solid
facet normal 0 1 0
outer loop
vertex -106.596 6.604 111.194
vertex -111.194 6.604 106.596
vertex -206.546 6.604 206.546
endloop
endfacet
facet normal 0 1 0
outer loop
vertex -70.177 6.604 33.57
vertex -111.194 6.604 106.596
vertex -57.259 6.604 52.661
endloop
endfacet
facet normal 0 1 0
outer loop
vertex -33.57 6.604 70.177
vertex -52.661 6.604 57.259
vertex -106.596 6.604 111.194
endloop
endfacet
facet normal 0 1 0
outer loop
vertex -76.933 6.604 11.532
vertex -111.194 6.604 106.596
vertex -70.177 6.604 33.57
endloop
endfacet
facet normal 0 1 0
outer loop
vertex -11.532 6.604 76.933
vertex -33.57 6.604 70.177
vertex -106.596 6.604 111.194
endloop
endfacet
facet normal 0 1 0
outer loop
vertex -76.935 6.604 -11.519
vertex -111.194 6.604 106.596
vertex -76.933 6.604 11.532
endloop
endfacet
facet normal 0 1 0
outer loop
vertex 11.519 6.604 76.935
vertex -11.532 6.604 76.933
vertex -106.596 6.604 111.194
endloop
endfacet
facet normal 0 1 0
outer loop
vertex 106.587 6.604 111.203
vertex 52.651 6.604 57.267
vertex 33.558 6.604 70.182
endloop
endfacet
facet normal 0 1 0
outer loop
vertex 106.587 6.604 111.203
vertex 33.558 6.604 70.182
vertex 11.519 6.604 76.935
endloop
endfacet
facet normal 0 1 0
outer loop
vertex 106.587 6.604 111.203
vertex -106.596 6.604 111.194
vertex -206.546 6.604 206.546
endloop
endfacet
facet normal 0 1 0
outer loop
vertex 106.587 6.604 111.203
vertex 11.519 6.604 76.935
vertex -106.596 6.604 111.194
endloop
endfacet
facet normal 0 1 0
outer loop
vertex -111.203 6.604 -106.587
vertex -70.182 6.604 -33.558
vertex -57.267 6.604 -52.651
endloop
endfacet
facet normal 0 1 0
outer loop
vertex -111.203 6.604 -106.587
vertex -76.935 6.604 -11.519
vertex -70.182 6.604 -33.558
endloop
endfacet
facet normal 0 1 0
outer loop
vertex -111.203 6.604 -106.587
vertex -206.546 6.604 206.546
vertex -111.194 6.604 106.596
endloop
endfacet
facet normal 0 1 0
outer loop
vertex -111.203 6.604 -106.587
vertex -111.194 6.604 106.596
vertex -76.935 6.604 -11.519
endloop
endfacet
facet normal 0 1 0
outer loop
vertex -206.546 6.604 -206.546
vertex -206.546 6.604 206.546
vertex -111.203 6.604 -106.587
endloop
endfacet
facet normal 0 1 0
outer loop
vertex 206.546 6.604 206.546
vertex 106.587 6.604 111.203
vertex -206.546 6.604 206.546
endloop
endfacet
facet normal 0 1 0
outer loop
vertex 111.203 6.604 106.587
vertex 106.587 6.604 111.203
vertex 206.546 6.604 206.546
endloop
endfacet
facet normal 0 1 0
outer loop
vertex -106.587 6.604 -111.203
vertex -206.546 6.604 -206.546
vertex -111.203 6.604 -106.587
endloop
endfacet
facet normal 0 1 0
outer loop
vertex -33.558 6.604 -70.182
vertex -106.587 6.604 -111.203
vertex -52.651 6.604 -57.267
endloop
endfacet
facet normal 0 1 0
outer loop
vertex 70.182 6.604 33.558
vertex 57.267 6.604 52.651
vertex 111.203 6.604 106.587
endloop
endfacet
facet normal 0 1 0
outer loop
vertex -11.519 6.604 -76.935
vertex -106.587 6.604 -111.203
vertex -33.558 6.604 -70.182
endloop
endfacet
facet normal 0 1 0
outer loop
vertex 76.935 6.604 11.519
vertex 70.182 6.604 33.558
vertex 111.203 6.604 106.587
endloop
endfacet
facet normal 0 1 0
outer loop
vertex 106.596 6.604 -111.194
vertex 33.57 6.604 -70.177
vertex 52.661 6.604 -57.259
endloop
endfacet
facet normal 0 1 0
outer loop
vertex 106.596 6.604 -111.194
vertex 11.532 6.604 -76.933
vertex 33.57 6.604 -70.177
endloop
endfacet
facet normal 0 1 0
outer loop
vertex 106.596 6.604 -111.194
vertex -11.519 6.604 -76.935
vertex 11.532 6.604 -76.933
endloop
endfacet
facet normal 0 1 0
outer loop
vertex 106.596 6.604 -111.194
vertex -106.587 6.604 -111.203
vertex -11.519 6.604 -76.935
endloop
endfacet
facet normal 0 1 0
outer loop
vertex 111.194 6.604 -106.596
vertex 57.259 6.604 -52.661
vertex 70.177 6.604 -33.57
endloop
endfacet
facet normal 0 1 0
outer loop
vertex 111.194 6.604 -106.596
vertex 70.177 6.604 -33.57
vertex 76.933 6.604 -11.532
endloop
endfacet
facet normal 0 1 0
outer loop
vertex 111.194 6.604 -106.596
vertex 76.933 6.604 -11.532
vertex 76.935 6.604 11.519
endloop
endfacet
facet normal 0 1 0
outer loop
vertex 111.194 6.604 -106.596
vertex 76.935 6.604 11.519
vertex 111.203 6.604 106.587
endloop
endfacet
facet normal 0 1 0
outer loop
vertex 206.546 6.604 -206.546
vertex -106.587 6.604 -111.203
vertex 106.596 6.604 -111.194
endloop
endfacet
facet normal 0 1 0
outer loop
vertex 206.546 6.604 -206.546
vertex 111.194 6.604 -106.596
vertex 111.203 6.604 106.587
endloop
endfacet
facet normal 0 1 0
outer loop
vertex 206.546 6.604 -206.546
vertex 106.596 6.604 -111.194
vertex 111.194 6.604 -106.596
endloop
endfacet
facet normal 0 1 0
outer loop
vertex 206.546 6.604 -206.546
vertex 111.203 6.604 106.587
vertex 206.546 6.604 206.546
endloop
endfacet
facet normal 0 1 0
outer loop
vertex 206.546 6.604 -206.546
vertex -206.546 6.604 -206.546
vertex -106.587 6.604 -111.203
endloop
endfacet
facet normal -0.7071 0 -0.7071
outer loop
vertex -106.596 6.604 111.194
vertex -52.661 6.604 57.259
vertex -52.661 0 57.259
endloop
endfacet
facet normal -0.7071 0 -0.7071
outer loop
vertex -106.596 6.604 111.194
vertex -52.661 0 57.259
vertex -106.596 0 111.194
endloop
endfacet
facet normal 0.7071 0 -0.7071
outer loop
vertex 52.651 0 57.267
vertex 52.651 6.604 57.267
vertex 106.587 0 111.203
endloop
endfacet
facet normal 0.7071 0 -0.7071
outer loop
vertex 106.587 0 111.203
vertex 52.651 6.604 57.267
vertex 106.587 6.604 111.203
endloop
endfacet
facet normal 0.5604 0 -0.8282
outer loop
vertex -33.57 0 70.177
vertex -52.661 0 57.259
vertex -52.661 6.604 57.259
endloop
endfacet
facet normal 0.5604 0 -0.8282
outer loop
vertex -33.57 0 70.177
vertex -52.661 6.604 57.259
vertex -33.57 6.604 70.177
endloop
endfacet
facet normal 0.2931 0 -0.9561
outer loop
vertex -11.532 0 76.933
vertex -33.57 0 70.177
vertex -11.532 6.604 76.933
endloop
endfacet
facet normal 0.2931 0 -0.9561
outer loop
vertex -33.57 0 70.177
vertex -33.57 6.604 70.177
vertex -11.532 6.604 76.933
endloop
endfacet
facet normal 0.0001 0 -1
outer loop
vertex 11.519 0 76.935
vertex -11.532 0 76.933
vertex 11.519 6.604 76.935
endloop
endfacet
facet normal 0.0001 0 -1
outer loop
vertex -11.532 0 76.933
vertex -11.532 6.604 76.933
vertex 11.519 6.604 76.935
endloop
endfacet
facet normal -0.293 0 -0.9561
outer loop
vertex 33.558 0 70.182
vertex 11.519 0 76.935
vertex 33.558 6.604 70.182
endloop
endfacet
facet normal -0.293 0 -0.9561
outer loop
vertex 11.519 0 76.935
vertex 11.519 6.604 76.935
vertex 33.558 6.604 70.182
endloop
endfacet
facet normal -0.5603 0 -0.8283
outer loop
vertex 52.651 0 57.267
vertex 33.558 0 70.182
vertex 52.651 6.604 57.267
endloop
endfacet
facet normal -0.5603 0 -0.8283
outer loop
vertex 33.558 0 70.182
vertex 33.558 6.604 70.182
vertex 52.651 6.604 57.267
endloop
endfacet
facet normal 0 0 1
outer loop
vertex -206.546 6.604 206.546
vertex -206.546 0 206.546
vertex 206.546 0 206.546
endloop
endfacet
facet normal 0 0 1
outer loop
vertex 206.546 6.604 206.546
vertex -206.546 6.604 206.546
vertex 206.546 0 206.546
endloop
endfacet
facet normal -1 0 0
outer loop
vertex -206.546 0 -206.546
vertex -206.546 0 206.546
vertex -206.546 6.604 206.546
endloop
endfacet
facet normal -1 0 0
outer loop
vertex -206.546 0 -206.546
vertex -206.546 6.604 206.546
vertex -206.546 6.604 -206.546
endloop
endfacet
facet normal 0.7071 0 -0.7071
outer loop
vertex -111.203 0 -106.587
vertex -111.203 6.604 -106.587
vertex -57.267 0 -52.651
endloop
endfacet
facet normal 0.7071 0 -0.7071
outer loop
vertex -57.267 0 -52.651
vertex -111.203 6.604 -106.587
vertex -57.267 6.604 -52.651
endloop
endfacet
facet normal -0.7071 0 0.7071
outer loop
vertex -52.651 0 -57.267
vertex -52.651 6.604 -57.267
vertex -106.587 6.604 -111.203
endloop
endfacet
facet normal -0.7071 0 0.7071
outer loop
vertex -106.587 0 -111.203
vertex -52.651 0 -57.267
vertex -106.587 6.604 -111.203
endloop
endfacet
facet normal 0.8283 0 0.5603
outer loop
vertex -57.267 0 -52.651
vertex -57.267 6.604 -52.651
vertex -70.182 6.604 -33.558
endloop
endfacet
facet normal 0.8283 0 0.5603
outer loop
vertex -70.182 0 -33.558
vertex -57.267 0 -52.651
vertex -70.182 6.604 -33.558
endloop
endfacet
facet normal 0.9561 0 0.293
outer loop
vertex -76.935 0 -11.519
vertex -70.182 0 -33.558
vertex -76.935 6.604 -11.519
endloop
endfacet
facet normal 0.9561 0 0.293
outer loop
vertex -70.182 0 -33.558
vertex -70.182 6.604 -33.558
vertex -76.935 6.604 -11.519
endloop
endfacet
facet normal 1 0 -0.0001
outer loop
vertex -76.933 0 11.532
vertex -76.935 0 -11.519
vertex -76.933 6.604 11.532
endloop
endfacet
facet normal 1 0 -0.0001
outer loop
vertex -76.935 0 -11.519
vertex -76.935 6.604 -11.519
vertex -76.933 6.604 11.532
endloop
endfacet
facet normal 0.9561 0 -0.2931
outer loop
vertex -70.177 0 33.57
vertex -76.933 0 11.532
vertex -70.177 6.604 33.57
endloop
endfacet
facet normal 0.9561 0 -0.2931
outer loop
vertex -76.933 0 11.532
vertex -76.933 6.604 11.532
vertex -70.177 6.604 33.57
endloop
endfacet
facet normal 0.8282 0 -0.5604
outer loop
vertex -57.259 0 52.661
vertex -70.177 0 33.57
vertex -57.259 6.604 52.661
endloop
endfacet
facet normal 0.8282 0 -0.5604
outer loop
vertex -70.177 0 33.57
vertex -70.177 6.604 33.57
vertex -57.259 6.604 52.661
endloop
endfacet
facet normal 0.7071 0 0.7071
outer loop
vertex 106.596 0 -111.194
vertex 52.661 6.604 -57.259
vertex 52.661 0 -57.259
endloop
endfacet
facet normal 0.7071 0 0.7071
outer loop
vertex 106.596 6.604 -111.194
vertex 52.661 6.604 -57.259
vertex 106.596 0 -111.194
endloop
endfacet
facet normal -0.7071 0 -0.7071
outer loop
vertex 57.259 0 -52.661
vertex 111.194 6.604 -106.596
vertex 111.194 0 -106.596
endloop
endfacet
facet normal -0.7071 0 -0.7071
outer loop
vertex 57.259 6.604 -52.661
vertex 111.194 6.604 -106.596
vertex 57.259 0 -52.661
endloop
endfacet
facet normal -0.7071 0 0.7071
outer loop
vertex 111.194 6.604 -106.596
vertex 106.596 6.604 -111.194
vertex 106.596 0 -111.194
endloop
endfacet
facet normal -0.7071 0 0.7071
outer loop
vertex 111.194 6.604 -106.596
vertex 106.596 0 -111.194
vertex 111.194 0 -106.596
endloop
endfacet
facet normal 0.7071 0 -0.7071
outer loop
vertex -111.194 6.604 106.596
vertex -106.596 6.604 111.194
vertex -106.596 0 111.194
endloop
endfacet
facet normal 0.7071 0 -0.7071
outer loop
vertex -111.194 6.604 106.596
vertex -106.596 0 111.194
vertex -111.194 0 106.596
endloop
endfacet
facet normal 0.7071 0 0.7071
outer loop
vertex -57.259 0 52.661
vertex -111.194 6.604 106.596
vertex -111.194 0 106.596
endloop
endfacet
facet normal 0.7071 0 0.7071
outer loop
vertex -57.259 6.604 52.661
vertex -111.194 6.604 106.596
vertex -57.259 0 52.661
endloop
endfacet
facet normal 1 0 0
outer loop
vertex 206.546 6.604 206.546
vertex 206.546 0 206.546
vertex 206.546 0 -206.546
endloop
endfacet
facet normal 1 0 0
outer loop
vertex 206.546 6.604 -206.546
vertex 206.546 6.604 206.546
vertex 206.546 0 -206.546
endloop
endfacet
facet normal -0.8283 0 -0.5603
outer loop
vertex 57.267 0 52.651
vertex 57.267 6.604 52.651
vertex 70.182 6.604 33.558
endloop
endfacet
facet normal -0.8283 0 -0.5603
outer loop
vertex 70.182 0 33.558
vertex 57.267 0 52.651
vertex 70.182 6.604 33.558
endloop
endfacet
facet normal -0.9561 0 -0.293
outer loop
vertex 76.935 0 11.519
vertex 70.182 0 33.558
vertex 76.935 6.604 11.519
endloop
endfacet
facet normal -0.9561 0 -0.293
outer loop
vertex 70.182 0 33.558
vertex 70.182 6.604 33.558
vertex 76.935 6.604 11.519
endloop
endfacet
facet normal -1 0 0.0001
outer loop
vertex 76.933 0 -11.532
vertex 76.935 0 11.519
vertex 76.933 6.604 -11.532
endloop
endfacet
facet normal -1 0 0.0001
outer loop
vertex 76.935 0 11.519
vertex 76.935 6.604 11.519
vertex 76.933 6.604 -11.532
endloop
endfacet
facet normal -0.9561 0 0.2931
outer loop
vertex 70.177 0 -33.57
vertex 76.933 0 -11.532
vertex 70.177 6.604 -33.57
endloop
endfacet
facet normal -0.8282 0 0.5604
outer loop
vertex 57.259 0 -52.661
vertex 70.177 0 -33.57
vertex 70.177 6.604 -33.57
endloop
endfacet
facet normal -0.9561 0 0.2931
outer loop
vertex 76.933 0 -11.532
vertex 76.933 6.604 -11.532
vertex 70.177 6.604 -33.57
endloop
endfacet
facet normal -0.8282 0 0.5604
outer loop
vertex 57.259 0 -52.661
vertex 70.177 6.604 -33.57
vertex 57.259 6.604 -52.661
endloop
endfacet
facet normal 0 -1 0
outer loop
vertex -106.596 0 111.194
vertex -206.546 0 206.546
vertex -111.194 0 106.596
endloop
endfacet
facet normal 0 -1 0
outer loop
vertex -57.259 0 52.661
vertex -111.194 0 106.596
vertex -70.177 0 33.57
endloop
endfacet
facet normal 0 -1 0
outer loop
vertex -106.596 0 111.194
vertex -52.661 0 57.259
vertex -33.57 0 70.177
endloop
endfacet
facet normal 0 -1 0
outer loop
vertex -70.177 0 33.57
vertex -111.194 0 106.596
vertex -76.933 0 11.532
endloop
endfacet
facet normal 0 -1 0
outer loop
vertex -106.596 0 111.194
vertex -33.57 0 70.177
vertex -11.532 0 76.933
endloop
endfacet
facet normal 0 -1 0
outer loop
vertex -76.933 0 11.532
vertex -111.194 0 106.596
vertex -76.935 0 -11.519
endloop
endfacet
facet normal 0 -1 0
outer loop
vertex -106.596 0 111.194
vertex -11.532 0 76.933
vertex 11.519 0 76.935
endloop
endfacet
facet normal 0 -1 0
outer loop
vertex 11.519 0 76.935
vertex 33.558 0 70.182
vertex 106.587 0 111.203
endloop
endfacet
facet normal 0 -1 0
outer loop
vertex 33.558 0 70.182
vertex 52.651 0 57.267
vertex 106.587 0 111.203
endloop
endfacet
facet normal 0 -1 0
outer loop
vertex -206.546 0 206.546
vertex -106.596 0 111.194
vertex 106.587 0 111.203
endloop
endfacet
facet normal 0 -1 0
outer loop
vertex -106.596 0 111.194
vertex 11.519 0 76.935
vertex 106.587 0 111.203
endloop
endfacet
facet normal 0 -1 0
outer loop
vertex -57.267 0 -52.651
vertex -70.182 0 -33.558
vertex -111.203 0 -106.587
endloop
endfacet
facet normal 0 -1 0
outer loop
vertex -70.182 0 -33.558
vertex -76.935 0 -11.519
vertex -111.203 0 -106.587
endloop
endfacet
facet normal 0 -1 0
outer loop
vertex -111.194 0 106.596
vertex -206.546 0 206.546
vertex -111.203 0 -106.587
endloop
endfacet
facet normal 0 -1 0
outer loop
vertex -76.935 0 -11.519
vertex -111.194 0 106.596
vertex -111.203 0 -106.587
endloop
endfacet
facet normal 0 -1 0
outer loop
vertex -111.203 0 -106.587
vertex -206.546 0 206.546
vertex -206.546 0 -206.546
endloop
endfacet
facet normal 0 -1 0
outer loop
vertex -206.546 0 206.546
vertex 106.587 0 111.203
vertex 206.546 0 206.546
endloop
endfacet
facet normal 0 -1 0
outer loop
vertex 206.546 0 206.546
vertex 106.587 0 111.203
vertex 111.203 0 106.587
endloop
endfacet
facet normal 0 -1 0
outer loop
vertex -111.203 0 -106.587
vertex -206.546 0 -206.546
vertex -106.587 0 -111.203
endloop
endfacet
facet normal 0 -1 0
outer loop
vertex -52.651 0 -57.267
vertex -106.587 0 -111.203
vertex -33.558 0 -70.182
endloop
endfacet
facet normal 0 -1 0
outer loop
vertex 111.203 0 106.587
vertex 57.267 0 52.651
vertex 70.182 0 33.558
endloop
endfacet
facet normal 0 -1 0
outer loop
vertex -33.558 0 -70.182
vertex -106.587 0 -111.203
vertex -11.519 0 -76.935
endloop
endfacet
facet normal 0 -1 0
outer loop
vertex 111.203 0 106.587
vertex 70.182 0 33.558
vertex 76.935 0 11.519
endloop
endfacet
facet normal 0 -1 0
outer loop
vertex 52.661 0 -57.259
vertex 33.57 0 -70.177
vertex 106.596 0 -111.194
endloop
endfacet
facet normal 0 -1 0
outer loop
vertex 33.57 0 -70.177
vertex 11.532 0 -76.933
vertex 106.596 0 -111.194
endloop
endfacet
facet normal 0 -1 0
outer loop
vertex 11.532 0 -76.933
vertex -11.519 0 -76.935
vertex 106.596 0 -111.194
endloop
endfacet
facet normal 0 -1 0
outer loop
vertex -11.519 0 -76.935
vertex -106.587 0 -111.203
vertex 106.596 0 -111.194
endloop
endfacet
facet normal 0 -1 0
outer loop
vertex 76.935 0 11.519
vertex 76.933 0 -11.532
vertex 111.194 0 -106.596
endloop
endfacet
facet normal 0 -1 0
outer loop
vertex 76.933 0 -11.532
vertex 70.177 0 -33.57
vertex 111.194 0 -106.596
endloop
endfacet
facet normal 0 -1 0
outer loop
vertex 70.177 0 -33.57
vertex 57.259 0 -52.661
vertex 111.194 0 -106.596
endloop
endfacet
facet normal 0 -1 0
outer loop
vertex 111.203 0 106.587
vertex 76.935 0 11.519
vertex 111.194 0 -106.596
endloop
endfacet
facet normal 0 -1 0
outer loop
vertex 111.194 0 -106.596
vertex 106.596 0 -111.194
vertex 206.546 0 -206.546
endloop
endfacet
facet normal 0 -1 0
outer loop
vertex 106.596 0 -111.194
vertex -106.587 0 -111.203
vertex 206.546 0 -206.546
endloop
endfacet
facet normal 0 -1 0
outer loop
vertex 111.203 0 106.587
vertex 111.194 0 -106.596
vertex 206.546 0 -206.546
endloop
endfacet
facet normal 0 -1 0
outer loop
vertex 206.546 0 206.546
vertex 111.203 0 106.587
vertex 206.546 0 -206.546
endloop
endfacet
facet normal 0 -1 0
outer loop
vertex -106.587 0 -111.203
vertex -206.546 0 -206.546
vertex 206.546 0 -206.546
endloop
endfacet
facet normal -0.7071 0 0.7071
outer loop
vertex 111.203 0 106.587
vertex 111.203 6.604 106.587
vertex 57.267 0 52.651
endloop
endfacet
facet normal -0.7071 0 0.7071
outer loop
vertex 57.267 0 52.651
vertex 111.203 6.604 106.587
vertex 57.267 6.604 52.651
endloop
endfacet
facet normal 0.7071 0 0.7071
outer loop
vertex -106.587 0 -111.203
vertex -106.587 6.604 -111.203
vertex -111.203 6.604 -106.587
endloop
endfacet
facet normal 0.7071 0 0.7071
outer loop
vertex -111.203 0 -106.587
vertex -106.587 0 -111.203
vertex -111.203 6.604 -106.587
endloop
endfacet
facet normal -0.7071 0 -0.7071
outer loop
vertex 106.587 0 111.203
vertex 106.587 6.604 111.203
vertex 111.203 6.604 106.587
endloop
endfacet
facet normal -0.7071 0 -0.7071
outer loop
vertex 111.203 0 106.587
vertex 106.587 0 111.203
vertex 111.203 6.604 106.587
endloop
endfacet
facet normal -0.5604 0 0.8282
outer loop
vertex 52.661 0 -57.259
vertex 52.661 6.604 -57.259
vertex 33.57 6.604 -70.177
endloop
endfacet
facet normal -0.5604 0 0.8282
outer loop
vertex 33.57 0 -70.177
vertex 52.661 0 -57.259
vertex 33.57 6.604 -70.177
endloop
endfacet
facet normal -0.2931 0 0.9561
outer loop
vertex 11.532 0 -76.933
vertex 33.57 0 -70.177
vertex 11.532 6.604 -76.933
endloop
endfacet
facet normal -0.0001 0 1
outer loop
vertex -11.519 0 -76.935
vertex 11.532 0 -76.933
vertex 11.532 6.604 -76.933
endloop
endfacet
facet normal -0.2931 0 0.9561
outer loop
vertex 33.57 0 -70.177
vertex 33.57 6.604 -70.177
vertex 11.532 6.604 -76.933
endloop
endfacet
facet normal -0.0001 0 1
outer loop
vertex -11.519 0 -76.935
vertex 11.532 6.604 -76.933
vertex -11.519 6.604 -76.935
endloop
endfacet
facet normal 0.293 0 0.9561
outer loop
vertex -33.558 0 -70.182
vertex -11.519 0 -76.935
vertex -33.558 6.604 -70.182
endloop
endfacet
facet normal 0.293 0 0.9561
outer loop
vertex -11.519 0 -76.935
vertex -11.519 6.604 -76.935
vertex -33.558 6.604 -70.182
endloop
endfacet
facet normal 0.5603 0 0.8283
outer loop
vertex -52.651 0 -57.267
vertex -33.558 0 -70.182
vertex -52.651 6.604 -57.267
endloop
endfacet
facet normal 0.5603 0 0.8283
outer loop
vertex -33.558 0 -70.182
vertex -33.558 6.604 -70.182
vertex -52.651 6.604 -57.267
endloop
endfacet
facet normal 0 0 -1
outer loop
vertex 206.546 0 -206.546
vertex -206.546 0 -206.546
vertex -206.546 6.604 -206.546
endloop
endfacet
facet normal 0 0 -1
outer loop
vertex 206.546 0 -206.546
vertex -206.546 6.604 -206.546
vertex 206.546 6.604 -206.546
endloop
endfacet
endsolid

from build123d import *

# Parameters (mm, degrees)
SKETCH4_W           = 413.09178157
SKETCH4_H           = 413.09178157
BOSS_EXTRUDE3_DEPTH = 6.604
SKETCH6_R           = 77.79258
CUT_EXTRUDE1_DEPTH  = 6.604
CUT_EXTRUDE2_DEPTH  = 6.604
CUT_EXTRUDE3_DEPTH  = 6.604


with BuildPart() as part:
    # Sketch4 → Boss-Extrude3 (new body)
    with BuildSketch(Plane(origin=(0, 0, 0), x_dir=(1, 0, 0), z_dir=(0, 1, 0))):
        Rectangle(SKETCH4_W, SKETCH4_H)
    extrude(amount=BOSS_EXTRUDE3_DEPTH)

    # Sketch6 → Cut-Extrude1 (cut)
    with BuildSketch(Plane(origin=(0, 6.604, 0), x_dir=(1, 0, 0), z_dir=(0, 1, 0))):
        Circle(SKETCH6_R)
    extrude(amount=-CUT_EXTRUDE1_DEPTH, mode=Mode.SUBTRACT)

    # Sketch8 → Cut-Extrude2 (cut)
    with BuildSketch(Plane(origin=(0, 6.604, 0), x_dir=(1, 0, 0), z_dir=(0, 1, 0))):
        Polygon((-111.193531291, -106.595640157), (106.595640157, 111.193531291), (111.193531291, 106.595640157), (-106.595640157, -111.193531291), align=None)
    extrude(amount=-CUT_EXTRUDE2_DEPTH, mode=Mode.SUBTRACT)

    # Sketch9 → Cut-Extrude3 (cut)
    with BuildSketch(Plane(origin=(0, 6.604, 0), x_dir=(1, 0, 0), z_dir=(0, 1, 0))):
        Polygon((111.202511547, -106.586659901), (-106.586659901, 111.202511547), (-111.202511547, 106.586659901), (106.586659901, -111.202511547), align=None)
    extrude(amount=-CUT_EXTRUDE3_DEPTH, mode=Mode.SUBTRACT)


solid = part.part
